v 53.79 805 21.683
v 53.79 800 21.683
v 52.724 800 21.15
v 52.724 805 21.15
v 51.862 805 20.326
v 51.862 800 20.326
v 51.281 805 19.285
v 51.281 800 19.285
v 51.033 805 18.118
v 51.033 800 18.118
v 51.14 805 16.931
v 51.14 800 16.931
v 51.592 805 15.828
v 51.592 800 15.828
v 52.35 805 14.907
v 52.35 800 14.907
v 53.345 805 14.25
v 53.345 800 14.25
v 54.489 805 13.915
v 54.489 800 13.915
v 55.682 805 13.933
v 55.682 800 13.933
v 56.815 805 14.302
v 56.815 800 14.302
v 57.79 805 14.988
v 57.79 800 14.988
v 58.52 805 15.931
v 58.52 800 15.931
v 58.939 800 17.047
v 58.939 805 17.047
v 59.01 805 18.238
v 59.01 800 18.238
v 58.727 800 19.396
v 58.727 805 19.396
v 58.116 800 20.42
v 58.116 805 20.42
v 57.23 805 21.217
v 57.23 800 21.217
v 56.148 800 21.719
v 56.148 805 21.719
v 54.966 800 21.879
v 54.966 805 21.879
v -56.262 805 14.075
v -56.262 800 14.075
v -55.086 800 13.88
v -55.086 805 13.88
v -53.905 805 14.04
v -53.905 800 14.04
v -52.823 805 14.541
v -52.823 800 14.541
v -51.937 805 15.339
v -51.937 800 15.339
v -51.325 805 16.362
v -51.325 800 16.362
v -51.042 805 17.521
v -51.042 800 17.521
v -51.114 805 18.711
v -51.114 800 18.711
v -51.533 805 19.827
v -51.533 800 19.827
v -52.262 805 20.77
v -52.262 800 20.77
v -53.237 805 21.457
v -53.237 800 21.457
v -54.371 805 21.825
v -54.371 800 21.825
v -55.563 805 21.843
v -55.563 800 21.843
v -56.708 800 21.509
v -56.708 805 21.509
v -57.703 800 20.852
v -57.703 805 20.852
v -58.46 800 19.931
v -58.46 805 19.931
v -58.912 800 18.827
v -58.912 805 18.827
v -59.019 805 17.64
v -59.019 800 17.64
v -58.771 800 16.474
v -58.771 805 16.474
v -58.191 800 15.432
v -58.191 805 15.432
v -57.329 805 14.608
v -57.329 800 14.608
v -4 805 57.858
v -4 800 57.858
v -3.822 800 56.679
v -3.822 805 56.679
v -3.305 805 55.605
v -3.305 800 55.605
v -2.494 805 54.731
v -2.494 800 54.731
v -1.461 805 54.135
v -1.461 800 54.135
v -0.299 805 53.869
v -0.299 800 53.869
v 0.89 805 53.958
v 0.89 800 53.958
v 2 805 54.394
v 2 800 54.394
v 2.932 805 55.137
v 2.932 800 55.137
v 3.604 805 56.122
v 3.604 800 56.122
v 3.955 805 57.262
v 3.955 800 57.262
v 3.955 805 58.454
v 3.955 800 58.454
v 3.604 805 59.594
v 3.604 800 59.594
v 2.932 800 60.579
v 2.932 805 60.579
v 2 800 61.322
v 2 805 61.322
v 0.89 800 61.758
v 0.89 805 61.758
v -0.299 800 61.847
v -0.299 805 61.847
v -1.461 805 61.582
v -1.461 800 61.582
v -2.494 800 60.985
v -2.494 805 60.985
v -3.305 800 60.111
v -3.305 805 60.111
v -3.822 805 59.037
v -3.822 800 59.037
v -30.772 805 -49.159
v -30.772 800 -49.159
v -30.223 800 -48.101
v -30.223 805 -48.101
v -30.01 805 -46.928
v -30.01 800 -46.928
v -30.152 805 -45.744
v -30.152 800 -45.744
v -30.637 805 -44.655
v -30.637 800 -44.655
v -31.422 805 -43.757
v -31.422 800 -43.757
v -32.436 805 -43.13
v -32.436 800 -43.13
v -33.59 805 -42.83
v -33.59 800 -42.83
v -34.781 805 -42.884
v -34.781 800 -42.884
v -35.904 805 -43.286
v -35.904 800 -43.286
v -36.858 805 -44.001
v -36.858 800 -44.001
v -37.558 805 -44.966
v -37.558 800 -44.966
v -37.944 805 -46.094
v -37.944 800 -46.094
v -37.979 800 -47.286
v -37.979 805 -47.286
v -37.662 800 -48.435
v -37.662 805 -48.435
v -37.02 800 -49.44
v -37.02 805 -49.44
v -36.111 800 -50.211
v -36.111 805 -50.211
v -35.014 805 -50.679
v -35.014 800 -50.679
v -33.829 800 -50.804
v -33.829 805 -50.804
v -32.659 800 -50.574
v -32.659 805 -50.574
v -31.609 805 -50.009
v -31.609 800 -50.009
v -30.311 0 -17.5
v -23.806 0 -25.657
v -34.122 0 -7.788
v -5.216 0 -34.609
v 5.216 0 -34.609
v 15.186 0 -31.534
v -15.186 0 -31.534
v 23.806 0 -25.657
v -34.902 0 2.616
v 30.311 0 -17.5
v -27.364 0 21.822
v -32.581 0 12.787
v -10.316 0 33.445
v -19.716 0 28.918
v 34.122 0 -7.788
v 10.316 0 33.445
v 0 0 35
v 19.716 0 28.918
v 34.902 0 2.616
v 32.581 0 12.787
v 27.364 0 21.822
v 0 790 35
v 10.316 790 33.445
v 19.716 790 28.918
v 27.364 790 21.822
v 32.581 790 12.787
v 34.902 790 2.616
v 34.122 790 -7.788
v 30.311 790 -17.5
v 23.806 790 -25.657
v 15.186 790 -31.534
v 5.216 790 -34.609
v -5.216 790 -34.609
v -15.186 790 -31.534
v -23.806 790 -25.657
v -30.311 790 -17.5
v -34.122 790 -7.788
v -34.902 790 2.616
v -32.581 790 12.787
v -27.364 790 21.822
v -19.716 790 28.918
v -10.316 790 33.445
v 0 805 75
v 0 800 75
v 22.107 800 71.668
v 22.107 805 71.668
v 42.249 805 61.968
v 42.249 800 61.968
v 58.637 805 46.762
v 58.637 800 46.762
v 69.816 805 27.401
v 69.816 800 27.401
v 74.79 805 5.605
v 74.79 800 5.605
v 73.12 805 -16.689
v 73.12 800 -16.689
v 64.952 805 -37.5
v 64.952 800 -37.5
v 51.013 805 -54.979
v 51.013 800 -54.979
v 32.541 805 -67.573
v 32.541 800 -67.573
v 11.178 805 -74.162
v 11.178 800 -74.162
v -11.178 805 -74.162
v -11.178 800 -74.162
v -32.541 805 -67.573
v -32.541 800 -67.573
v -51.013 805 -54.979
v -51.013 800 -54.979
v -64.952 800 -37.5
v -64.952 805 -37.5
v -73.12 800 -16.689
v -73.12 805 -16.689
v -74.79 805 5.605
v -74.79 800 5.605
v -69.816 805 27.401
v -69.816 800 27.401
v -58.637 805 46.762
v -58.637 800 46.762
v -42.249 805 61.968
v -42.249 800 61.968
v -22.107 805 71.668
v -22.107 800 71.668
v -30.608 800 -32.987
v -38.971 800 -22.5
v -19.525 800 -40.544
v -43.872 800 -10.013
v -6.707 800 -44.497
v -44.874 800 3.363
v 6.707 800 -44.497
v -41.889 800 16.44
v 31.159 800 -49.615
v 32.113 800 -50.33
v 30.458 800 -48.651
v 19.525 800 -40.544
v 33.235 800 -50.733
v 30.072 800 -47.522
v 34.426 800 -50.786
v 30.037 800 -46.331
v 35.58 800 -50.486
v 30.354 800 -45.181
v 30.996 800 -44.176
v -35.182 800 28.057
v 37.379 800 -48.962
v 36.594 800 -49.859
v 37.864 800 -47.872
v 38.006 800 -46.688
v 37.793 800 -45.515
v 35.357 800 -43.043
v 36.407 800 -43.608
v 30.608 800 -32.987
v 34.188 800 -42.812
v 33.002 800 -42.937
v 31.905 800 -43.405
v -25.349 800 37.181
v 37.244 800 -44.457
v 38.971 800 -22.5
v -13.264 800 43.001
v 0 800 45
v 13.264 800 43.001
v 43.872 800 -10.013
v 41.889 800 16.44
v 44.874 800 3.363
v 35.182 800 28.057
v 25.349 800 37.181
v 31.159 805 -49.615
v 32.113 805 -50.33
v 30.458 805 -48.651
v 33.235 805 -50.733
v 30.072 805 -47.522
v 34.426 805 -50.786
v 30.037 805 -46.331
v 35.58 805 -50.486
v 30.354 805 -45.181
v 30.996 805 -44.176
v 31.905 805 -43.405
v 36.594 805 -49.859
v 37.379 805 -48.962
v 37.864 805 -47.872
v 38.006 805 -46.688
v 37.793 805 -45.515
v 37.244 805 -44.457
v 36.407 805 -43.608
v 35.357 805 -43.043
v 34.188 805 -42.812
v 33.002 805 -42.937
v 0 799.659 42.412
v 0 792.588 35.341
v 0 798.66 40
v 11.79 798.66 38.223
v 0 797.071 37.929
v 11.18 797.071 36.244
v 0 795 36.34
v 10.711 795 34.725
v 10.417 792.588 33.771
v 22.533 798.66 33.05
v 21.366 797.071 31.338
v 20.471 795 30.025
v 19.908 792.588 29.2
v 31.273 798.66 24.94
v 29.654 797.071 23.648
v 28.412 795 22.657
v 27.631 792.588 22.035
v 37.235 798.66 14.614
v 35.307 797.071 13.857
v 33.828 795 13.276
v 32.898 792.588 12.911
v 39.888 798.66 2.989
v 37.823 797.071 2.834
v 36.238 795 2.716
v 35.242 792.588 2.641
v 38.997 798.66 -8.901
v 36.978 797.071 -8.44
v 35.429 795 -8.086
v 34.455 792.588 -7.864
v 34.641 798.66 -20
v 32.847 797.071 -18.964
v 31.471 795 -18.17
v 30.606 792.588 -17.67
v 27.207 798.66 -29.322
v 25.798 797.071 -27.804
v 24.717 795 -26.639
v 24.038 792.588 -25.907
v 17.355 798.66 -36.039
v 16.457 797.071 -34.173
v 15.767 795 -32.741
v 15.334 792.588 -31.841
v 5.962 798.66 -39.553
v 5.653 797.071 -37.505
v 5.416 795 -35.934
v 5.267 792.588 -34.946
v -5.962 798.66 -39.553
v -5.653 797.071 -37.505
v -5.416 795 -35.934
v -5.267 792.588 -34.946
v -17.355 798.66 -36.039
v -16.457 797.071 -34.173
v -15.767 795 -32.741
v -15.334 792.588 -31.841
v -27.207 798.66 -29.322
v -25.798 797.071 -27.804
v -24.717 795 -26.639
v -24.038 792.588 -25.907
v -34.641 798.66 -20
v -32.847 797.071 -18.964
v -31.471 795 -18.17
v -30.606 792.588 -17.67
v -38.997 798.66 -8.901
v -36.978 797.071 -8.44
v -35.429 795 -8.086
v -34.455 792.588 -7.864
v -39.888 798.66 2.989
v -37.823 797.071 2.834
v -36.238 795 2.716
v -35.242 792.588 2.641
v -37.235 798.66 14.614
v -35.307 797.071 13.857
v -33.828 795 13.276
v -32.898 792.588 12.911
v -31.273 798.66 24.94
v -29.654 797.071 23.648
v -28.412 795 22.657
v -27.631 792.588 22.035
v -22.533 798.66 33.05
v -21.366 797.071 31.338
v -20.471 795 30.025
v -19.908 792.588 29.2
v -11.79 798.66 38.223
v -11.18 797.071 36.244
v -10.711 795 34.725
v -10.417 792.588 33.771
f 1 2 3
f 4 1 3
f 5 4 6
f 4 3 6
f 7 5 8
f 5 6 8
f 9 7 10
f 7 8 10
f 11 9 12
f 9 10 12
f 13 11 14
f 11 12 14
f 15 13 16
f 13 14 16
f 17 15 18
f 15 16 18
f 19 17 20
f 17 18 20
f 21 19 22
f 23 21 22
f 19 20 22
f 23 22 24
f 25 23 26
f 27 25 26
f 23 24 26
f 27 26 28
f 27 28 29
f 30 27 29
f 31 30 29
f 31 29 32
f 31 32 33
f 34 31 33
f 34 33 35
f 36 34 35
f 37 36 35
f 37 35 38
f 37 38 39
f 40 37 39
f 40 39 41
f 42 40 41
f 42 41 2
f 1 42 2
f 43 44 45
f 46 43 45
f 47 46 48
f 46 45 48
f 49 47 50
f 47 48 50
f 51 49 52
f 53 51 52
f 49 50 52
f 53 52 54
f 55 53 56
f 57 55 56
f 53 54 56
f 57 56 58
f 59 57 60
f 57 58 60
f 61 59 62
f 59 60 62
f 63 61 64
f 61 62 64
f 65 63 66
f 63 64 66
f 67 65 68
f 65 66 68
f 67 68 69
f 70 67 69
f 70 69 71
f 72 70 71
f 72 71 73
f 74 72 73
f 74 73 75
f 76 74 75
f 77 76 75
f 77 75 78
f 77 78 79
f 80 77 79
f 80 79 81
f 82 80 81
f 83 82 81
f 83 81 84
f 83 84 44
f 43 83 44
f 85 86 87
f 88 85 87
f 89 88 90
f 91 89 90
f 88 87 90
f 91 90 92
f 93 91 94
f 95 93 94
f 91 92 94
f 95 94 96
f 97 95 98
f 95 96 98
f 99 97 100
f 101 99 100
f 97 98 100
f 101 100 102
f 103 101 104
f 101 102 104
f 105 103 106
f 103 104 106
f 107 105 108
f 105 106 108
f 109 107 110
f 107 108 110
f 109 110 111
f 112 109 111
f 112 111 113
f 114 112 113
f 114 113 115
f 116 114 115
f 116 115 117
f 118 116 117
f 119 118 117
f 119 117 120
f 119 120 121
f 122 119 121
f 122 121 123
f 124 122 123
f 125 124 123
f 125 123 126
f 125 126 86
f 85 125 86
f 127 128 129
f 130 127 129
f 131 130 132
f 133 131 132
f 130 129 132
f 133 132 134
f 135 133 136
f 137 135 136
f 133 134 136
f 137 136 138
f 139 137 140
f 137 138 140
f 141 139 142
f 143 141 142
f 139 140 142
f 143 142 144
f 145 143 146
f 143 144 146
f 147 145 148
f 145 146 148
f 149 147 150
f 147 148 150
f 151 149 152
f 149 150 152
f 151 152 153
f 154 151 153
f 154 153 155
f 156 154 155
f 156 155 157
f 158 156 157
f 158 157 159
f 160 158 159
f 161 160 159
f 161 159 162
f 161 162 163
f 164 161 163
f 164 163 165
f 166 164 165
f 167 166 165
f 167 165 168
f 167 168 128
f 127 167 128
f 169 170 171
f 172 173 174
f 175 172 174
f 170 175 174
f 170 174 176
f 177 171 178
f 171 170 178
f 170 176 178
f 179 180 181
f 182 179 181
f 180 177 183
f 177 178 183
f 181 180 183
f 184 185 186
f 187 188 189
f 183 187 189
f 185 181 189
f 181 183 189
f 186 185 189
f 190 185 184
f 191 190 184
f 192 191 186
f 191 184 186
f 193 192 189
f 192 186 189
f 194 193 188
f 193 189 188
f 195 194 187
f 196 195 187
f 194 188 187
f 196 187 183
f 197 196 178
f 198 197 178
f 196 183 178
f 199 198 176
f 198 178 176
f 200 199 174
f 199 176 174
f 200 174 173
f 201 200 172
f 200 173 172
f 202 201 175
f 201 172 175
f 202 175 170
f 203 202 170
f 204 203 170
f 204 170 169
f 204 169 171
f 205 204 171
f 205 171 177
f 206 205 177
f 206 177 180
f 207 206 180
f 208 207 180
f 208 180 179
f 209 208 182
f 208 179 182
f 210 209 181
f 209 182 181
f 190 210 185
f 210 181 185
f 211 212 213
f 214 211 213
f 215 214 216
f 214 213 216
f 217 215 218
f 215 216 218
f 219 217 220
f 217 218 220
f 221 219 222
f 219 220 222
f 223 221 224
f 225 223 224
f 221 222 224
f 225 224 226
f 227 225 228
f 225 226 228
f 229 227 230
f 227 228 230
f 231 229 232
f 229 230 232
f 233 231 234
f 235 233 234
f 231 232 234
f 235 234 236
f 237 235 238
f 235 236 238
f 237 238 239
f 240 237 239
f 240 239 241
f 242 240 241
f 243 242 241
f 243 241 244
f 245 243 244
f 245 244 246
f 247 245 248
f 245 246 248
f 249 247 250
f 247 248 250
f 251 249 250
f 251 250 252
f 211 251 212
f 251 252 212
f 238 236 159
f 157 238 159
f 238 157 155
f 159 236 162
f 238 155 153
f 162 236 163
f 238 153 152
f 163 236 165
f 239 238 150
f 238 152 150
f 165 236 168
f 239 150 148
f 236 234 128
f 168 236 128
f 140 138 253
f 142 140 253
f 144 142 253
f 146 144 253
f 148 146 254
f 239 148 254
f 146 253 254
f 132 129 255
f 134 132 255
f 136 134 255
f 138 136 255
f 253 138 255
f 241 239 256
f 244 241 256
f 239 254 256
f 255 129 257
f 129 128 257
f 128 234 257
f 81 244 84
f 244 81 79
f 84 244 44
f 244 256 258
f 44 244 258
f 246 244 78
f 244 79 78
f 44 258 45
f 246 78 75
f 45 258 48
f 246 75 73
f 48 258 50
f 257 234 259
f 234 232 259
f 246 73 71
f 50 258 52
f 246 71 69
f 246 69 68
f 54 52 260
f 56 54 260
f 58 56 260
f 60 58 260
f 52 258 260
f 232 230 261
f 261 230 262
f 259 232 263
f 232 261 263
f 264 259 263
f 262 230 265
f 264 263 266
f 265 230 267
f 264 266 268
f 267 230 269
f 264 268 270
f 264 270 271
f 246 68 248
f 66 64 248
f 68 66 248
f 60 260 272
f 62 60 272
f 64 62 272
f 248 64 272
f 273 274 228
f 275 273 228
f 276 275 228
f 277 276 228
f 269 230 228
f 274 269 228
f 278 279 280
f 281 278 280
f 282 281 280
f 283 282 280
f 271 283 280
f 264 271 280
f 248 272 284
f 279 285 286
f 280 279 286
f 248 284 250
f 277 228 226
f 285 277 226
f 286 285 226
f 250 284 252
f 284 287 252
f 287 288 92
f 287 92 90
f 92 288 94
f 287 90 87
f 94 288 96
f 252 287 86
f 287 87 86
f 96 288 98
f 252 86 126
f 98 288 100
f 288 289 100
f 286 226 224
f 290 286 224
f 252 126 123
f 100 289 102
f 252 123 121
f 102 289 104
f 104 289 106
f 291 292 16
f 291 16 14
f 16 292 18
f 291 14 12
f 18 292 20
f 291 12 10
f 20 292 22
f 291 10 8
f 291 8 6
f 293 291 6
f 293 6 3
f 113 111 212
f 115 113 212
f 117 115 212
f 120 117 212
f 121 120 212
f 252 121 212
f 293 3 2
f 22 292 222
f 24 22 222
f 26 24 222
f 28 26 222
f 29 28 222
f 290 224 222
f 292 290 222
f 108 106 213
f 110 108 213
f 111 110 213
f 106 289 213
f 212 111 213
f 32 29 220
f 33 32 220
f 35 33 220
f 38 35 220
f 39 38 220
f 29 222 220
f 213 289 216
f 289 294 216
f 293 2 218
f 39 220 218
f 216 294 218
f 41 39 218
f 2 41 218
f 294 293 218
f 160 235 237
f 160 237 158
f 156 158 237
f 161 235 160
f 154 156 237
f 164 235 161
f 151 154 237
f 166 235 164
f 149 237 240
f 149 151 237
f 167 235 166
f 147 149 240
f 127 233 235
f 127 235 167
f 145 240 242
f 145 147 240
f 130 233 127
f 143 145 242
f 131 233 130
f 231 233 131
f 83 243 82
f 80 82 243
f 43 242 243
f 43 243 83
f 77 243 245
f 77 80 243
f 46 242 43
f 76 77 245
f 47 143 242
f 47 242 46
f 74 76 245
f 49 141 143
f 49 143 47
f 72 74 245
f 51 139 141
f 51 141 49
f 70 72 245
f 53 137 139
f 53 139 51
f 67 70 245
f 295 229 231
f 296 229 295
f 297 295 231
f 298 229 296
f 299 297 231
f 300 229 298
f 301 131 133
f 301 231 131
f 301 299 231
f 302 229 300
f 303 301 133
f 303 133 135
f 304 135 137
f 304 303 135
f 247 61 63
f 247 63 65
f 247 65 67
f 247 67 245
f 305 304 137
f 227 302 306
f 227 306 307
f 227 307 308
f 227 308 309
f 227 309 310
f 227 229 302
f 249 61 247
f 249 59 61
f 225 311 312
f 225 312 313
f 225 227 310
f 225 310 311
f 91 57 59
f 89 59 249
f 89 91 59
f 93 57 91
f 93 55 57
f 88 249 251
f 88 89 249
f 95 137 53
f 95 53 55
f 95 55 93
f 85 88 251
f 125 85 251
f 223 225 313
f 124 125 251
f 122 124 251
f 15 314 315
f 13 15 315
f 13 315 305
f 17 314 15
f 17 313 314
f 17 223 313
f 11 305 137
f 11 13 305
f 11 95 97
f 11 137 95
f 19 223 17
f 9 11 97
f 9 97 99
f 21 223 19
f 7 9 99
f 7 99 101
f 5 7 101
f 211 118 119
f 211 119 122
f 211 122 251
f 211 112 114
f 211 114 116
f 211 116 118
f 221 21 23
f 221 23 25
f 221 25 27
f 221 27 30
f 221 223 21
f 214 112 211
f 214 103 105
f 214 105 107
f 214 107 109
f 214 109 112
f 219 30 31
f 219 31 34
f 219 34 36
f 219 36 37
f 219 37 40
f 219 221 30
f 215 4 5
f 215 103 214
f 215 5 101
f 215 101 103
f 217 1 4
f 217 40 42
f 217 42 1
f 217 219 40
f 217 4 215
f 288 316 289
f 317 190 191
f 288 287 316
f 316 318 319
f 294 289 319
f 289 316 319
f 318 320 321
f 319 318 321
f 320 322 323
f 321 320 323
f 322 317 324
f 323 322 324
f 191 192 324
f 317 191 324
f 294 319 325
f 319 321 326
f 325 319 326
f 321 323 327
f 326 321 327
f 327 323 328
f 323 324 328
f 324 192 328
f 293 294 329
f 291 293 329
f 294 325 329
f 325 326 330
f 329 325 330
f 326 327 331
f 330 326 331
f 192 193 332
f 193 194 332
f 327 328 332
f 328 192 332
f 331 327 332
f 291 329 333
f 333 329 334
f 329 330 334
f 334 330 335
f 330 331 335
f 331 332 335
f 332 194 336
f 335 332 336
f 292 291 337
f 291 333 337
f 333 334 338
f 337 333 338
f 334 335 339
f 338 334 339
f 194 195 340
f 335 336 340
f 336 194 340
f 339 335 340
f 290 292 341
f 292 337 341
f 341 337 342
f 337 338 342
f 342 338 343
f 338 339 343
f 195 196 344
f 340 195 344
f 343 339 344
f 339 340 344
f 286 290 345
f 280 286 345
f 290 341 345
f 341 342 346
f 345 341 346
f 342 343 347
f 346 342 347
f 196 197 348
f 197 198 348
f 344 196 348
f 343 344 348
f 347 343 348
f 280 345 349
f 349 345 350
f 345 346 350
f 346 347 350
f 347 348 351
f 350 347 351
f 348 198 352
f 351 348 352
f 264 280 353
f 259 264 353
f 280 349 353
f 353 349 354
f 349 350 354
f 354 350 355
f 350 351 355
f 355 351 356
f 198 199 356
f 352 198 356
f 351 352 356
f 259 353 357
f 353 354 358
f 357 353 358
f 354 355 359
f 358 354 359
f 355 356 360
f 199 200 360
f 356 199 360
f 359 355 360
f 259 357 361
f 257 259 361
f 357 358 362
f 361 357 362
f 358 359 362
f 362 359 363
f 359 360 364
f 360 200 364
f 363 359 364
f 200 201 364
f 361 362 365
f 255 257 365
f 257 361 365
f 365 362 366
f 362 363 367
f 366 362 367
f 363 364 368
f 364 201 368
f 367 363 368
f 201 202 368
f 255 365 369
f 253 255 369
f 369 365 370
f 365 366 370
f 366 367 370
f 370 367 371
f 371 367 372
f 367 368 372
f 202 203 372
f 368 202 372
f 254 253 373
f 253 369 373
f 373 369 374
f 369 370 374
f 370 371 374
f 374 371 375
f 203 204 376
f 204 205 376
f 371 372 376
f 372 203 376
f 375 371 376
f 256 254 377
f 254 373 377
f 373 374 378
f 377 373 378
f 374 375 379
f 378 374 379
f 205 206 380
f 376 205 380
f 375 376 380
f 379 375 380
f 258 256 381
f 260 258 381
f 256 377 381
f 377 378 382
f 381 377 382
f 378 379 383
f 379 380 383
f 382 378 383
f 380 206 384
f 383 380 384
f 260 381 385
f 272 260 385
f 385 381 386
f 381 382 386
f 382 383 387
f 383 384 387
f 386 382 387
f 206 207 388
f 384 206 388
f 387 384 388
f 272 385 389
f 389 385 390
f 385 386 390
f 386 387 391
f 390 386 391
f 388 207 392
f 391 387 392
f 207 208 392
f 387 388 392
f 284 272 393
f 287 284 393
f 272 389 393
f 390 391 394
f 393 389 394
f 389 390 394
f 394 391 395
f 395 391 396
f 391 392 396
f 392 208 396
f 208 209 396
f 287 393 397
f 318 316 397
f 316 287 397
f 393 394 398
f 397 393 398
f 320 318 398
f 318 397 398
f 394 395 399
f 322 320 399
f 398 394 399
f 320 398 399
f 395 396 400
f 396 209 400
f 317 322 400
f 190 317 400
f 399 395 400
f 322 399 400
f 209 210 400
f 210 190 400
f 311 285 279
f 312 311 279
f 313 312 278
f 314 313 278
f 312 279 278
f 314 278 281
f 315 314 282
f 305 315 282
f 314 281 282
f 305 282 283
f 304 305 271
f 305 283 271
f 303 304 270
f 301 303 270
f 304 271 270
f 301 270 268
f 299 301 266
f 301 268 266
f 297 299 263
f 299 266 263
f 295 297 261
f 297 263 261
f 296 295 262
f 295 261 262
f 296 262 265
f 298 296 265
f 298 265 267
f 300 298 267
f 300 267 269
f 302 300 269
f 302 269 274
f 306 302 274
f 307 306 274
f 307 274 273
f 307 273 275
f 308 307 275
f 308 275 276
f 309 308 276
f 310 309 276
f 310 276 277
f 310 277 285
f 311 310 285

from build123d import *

# Parameters (mm, degrees)
SKETCH1_R                = 35
BOSS_EXTRUDE1_DEPTH      = 800
SKETCH2_R                = 75
BOSS_EXTRUDE2_DEPTH      = 5
FILLET1_R                = 10
F_8_0_8_DIAMETER_HOLE1_D = 8
CIRPATTERN1_COUNT        = 5


with BuildPart() as part:
    # Sketch1 → Boss-Extrude1 (new body)
    with BuildSketch(Plane(origin=(0, 0, 0), x_dir=(1, 0, 0), z_dir=(0, 1, 0))):
        with Locations(Location((0, 0, 0), (0, 0, 270))):
            Circle(SKETCH1_R)
    extrude(amount=BOSS_EXTRUDE1_DEPTH)

    # Sketch2 → Boss-Extrude2 (add)
    with BuildSketch(Plane(origin=(0, 800, 0), x_dir=(1, 0, 0), z_dir=(0, 1, 0))):
        with Locations(Location((0, 0, 0), (0, 0, 270))):
            Circle(SKETCH2_R)
    extrude(amount=BOSS_EXTRUDE2_DEPTH)

    # Fillet1
    fillet1_edges = [part.edges().sort_by_distance(p)[0] for p in [
        (0, 800, -35),
    ]]
    fillet(fillet1_edges, radius=FILLET1_R)

    # Ø8.0 (8) Diameter Hole1 (through all)
    with Locations(Plane(origin=(0, 805, 0), x_dir=(1, 0, 0), z_dir=(0, 1, 0))):
        with Locations((0, -57.858005833)):
            f_8_0_8_diameter_hole1 = Hole(F_8_0_8_DIAMETER_HOLE1_D / 2)

    # CirPattern1: Ø8.0 (8) Diameter Hole1 ×5 about axis
    cirpattern1_axis = Axis((0, 0, 0), (0, 1, 0))
    for i in range(1, CIRPATTERN1_COUNT):
        add(f_8_0_8_diameter_hole1.rotate(cirpattern1_axis, i * 360 / CIRPATTERN1_COUNT), mode=Mode.SUBTRACT)


solid = part.part
